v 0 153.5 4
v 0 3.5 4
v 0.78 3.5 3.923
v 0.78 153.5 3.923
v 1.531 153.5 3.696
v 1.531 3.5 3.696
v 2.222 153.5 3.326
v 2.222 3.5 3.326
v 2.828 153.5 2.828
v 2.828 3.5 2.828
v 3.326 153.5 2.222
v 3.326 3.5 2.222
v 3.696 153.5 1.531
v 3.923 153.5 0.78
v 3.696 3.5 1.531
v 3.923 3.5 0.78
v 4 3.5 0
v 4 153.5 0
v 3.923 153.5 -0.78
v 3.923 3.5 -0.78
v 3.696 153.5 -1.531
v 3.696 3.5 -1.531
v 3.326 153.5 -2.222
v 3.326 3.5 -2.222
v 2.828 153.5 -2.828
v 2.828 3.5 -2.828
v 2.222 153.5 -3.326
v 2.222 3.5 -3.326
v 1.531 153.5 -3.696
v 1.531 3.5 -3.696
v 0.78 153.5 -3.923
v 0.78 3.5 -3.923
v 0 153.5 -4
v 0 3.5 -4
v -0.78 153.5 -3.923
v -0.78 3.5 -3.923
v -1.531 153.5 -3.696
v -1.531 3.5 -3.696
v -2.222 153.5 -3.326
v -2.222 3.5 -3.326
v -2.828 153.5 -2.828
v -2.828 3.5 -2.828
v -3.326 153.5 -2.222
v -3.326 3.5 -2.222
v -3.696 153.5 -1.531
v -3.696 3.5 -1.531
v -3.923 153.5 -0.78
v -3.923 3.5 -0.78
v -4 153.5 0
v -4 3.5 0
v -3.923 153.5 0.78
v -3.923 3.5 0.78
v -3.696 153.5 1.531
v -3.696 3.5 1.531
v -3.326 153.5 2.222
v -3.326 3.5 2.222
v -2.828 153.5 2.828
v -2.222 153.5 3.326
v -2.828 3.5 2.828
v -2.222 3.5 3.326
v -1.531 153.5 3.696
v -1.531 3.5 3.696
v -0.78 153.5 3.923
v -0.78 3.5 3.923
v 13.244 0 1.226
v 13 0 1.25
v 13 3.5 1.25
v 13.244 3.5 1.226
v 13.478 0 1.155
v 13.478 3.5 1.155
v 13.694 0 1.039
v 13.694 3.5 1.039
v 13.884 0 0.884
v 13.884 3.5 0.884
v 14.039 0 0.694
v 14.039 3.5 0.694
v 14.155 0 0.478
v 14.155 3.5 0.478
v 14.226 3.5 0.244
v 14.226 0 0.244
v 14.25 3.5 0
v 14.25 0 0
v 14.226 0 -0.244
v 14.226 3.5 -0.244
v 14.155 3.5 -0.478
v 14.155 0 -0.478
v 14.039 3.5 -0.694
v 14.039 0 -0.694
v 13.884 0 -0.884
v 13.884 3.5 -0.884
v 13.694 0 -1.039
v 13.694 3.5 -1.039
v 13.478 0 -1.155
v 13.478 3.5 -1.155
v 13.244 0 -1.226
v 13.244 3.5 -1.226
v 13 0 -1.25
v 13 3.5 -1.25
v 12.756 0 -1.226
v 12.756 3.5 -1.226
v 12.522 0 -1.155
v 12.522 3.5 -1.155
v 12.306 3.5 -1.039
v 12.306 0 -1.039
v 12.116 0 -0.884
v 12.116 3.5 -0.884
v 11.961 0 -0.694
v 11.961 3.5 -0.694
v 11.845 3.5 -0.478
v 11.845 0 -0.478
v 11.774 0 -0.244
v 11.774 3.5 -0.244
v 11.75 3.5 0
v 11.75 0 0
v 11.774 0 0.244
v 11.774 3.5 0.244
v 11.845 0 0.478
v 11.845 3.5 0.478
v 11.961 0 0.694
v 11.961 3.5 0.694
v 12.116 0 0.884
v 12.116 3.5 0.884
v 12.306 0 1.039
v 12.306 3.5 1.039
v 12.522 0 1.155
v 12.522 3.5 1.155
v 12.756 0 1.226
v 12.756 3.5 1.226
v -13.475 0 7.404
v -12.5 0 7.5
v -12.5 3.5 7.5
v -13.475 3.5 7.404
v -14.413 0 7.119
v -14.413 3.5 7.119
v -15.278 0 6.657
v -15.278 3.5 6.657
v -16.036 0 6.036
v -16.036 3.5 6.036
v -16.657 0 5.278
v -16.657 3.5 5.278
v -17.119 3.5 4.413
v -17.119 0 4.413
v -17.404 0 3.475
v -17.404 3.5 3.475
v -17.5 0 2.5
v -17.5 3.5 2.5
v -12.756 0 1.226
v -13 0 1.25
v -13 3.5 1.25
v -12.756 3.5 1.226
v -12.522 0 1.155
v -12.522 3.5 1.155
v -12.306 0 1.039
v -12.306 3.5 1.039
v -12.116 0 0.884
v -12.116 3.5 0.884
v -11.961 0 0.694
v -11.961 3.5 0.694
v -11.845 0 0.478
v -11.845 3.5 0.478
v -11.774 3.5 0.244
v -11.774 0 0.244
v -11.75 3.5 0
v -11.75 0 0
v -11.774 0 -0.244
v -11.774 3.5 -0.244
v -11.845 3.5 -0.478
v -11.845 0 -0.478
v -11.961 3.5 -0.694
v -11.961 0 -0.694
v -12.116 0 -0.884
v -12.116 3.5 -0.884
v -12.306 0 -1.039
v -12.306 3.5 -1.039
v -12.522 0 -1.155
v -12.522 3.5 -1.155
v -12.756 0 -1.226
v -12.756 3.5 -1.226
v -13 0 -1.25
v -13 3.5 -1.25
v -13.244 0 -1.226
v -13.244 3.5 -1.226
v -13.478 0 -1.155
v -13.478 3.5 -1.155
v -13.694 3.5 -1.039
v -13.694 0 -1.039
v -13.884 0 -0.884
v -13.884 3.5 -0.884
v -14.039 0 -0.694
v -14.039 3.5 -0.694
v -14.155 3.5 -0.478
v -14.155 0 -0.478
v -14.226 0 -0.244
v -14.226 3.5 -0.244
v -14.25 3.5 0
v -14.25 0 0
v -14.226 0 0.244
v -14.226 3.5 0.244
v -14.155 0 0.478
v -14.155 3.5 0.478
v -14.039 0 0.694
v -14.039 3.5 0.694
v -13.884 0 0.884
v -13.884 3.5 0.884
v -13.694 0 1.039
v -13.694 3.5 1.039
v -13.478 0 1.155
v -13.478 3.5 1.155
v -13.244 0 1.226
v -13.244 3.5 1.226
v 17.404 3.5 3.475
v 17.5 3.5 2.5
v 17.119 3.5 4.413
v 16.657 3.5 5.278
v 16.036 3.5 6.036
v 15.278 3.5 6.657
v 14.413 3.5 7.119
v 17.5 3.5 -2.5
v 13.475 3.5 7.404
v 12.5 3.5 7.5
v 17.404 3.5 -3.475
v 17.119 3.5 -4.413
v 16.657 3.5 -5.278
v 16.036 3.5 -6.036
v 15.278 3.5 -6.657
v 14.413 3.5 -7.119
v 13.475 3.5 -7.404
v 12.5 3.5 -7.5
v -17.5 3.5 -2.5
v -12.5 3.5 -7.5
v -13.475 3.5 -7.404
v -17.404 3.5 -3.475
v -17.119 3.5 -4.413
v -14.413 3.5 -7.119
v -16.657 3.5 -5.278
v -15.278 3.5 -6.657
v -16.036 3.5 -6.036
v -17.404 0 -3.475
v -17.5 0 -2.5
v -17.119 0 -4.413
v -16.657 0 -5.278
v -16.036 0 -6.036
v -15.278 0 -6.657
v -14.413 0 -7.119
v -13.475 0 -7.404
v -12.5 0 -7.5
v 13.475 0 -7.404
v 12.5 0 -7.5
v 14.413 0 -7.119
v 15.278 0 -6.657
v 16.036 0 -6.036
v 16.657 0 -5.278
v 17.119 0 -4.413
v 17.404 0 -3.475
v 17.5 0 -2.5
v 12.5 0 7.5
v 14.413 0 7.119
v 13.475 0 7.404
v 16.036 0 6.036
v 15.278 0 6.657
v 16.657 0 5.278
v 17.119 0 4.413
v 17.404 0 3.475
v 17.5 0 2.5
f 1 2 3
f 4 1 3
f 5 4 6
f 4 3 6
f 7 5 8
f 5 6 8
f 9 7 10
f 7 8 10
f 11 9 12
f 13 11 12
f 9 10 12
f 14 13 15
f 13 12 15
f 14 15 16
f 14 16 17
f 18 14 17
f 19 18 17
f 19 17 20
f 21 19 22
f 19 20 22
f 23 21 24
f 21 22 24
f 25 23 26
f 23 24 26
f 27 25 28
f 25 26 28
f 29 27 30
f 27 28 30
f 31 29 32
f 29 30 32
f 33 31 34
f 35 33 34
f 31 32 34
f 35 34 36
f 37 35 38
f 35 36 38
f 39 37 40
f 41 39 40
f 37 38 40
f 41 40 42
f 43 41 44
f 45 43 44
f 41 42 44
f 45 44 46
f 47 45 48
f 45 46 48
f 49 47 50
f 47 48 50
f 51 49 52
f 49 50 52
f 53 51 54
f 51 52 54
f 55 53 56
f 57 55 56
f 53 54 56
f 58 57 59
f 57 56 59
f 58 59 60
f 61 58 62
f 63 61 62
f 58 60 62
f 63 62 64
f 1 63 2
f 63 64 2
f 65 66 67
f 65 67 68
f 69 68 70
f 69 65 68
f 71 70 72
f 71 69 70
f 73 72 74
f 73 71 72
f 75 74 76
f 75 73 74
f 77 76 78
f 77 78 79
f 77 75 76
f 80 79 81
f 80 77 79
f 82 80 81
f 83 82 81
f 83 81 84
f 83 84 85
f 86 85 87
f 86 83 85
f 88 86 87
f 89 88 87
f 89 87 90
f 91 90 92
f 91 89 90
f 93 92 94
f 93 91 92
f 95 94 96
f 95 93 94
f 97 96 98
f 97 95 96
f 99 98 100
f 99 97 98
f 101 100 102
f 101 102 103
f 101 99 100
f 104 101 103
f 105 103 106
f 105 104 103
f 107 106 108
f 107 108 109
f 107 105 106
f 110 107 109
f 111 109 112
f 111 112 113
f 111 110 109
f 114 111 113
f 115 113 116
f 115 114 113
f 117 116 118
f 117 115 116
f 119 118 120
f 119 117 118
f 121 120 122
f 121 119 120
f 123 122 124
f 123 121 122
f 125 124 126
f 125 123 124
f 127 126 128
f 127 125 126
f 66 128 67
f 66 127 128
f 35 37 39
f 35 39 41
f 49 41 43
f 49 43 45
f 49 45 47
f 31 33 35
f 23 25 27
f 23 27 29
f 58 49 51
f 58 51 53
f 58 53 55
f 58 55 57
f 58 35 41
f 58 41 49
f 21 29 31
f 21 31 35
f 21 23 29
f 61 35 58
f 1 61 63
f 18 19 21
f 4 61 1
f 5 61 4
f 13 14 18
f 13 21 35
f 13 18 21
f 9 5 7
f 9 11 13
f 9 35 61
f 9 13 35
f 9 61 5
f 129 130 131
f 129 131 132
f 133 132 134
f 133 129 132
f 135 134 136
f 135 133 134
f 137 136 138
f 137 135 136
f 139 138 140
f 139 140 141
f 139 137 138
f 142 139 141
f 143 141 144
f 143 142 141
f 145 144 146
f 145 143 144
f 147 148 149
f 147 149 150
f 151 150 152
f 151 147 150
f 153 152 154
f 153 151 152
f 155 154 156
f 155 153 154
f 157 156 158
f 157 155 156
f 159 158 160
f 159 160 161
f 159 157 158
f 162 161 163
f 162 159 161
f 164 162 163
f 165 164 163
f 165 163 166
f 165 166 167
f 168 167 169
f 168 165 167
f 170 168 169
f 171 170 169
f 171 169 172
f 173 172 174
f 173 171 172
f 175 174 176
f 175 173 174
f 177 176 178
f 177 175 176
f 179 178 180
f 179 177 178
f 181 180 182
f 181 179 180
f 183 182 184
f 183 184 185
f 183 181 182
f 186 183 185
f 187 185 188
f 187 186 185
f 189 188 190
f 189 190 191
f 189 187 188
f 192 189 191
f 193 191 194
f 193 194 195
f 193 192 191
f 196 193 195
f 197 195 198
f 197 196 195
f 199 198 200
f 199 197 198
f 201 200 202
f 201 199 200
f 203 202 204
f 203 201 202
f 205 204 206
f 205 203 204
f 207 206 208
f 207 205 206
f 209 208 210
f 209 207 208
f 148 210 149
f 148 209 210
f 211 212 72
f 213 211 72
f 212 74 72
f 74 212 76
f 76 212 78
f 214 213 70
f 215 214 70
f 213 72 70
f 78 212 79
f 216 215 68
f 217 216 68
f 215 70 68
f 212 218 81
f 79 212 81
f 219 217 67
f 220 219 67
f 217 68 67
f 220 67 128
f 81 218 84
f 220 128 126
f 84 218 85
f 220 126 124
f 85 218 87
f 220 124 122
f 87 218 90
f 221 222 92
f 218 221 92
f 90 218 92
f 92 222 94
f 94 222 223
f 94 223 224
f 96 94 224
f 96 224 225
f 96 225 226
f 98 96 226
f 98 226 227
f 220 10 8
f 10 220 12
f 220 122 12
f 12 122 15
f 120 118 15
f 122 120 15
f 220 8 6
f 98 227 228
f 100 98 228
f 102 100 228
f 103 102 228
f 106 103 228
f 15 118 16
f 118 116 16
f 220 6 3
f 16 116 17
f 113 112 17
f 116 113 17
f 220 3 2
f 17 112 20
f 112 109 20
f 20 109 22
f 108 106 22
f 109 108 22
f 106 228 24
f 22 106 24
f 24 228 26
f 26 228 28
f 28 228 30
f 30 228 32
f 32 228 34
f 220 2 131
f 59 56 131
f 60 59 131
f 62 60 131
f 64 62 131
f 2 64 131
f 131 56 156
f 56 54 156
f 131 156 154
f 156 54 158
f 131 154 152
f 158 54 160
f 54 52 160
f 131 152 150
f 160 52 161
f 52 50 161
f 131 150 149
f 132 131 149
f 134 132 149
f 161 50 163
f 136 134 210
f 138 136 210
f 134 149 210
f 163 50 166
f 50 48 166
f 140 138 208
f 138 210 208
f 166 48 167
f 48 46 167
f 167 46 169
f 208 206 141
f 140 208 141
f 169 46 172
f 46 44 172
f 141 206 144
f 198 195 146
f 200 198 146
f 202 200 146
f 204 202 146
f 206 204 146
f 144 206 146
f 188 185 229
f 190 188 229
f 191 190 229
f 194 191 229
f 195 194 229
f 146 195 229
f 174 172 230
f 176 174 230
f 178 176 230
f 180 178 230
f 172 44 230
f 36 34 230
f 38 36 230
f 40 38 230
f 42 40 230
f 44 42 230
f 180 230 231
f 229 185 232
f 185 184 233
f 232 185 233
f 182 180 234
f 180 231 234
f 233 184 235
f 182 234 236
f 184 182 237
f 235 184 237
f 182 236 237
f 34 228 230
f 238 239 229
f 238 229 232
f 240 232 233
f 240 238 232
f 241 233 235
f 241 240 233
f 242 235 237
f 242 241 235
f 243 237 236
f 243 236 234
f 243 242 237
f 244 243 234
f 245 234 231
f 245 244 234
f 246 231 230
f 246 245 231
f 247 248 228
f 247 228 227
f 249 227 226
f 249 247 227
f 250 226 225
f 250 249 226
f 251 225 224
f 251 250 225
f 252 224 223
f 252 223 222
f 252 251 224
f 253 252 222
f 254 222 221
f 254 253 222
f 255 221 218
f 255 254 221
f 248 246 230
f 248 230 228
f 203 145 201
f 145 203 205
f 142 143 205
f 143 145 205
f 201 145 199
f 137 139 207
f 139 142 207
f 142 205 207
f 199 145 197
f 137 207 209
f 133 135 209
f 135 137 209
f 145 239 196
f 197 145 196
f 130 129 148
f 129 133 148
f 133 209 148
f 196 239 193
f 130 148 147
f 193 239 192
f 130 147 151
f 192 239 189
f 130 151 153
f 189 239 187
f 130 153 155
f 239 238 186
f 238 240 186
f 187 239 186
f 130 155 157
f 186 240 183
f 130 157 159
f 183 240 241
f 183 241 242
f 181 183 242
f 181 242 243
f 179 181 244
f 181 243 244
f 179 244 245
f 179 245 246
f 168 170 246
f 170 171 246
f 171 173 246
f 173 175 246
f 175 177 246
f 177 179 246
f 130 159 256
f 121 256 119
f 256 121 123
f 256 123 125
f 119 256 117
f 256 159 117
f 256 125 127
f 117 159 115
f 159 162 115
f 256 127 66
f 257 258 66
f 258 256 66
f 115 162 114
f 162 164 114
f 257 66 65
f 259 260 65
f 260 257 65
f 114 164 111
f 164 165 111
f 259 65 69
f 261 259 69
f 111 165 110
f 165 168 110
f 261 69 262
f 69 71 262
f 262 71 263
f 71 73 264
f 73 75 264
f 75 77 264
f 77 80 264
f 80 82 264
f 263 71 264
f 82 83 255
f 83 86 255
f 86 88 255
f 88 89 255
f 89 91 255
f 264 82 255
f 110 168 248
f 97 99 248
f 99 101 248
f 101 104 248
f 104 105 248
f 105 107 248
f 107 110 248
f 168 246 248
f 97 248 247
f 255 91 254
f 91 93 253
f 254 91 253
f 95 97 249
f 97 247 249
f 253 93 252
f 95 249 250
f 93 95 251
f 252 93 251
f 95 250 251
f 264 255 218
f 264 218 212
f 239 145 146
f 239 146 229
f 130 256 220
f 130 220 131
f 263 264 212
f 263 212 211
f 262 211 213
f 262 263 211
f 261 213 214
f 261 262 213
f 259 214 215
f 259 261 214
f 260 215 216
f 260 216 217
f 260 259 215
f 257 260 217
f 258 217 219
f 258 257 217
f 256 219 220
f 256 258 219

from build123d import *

# Parameters (mm, degrees)
CROQUIS1_R              = 4
CROQUIS1_R_2            = 1.25
SALIENTE_EXTRUIR1_DEPTH = 3.5
CROQUIS2_R              = 4
SALIENTE_EXTRUIR2_DEPTH = 150


with BuildPart() as part:
    # Croquis1 → Saliente-Extruir1 (new body)
    # profile 1 of 2: a face of its own
    with BuildSketch(Plane(origin=(0, 0, 0), x_dir=(1, 0, 0), z_dir=(0, 1, 0))):
        with BuildLine():
            Line((17.5, 2.5), (17.5, -2.5))
            ThreePointArc((17.5, -2.5), (16.035533906, -6.035533906), (12.5, -7.5))
            Line((12.5, -7.5), (-12.5, -7.5))
            ThreePointArc((-12.5, -7.5), (-16.035533906, -6.035533906), (-17.5, -2.5))
            Line((-17.5, -2.5), (-17.5, 2.5))
            ThreePointArc((-17.5, 2.5), (-16.035533906, 6.035533906), (-12.5, 7.5))
            Line((-12.5, 7.5), (12.5, 7.5))
            ThreePointArc((12.5, 7.5), (16.035533906, 6.035533906), (17.5, 2.5))
        make_face()
        Circle(CROQUIS1_R, mode=Mode.SUBTRACT)
        with Locations(Location((-13, 0, 0), (0, 0, 270))):
            Circle(CROQUIS1_R_2, mode=Mode.SUBTRACT)
        with Locations(Location((13, 0, 0), (0, 0, 270))):
            Circle(CROQUIS1_R_2, mode=Mode.SUBTRACT)
    # profile 2 of 2: a face of its own
    with BuildSketch(Plane(origin=(0, 0, 0), x_dir=(1, 0, 0), z_dir=(0, 1, 0))):
        Circle(CROQUIS1_R)
    extrude(amount=SALIENTE_EXTRUIR1_DEPTH)

    # Croquis2 → Saliente-Extruir2 (add)
    with BuildSketch(Plane(origin=(0, 3.5, 0), x_dir=(1, 0, 0), z_dir=(0, 1, 0))):
        with Locations(Location((0, 0, 0), (0, 0, 270))):
            Circle(CROQUIS2_R)
    extrude(amount=SALIENTE_EXTRUIR2_DEPTH)


solid = part.part
